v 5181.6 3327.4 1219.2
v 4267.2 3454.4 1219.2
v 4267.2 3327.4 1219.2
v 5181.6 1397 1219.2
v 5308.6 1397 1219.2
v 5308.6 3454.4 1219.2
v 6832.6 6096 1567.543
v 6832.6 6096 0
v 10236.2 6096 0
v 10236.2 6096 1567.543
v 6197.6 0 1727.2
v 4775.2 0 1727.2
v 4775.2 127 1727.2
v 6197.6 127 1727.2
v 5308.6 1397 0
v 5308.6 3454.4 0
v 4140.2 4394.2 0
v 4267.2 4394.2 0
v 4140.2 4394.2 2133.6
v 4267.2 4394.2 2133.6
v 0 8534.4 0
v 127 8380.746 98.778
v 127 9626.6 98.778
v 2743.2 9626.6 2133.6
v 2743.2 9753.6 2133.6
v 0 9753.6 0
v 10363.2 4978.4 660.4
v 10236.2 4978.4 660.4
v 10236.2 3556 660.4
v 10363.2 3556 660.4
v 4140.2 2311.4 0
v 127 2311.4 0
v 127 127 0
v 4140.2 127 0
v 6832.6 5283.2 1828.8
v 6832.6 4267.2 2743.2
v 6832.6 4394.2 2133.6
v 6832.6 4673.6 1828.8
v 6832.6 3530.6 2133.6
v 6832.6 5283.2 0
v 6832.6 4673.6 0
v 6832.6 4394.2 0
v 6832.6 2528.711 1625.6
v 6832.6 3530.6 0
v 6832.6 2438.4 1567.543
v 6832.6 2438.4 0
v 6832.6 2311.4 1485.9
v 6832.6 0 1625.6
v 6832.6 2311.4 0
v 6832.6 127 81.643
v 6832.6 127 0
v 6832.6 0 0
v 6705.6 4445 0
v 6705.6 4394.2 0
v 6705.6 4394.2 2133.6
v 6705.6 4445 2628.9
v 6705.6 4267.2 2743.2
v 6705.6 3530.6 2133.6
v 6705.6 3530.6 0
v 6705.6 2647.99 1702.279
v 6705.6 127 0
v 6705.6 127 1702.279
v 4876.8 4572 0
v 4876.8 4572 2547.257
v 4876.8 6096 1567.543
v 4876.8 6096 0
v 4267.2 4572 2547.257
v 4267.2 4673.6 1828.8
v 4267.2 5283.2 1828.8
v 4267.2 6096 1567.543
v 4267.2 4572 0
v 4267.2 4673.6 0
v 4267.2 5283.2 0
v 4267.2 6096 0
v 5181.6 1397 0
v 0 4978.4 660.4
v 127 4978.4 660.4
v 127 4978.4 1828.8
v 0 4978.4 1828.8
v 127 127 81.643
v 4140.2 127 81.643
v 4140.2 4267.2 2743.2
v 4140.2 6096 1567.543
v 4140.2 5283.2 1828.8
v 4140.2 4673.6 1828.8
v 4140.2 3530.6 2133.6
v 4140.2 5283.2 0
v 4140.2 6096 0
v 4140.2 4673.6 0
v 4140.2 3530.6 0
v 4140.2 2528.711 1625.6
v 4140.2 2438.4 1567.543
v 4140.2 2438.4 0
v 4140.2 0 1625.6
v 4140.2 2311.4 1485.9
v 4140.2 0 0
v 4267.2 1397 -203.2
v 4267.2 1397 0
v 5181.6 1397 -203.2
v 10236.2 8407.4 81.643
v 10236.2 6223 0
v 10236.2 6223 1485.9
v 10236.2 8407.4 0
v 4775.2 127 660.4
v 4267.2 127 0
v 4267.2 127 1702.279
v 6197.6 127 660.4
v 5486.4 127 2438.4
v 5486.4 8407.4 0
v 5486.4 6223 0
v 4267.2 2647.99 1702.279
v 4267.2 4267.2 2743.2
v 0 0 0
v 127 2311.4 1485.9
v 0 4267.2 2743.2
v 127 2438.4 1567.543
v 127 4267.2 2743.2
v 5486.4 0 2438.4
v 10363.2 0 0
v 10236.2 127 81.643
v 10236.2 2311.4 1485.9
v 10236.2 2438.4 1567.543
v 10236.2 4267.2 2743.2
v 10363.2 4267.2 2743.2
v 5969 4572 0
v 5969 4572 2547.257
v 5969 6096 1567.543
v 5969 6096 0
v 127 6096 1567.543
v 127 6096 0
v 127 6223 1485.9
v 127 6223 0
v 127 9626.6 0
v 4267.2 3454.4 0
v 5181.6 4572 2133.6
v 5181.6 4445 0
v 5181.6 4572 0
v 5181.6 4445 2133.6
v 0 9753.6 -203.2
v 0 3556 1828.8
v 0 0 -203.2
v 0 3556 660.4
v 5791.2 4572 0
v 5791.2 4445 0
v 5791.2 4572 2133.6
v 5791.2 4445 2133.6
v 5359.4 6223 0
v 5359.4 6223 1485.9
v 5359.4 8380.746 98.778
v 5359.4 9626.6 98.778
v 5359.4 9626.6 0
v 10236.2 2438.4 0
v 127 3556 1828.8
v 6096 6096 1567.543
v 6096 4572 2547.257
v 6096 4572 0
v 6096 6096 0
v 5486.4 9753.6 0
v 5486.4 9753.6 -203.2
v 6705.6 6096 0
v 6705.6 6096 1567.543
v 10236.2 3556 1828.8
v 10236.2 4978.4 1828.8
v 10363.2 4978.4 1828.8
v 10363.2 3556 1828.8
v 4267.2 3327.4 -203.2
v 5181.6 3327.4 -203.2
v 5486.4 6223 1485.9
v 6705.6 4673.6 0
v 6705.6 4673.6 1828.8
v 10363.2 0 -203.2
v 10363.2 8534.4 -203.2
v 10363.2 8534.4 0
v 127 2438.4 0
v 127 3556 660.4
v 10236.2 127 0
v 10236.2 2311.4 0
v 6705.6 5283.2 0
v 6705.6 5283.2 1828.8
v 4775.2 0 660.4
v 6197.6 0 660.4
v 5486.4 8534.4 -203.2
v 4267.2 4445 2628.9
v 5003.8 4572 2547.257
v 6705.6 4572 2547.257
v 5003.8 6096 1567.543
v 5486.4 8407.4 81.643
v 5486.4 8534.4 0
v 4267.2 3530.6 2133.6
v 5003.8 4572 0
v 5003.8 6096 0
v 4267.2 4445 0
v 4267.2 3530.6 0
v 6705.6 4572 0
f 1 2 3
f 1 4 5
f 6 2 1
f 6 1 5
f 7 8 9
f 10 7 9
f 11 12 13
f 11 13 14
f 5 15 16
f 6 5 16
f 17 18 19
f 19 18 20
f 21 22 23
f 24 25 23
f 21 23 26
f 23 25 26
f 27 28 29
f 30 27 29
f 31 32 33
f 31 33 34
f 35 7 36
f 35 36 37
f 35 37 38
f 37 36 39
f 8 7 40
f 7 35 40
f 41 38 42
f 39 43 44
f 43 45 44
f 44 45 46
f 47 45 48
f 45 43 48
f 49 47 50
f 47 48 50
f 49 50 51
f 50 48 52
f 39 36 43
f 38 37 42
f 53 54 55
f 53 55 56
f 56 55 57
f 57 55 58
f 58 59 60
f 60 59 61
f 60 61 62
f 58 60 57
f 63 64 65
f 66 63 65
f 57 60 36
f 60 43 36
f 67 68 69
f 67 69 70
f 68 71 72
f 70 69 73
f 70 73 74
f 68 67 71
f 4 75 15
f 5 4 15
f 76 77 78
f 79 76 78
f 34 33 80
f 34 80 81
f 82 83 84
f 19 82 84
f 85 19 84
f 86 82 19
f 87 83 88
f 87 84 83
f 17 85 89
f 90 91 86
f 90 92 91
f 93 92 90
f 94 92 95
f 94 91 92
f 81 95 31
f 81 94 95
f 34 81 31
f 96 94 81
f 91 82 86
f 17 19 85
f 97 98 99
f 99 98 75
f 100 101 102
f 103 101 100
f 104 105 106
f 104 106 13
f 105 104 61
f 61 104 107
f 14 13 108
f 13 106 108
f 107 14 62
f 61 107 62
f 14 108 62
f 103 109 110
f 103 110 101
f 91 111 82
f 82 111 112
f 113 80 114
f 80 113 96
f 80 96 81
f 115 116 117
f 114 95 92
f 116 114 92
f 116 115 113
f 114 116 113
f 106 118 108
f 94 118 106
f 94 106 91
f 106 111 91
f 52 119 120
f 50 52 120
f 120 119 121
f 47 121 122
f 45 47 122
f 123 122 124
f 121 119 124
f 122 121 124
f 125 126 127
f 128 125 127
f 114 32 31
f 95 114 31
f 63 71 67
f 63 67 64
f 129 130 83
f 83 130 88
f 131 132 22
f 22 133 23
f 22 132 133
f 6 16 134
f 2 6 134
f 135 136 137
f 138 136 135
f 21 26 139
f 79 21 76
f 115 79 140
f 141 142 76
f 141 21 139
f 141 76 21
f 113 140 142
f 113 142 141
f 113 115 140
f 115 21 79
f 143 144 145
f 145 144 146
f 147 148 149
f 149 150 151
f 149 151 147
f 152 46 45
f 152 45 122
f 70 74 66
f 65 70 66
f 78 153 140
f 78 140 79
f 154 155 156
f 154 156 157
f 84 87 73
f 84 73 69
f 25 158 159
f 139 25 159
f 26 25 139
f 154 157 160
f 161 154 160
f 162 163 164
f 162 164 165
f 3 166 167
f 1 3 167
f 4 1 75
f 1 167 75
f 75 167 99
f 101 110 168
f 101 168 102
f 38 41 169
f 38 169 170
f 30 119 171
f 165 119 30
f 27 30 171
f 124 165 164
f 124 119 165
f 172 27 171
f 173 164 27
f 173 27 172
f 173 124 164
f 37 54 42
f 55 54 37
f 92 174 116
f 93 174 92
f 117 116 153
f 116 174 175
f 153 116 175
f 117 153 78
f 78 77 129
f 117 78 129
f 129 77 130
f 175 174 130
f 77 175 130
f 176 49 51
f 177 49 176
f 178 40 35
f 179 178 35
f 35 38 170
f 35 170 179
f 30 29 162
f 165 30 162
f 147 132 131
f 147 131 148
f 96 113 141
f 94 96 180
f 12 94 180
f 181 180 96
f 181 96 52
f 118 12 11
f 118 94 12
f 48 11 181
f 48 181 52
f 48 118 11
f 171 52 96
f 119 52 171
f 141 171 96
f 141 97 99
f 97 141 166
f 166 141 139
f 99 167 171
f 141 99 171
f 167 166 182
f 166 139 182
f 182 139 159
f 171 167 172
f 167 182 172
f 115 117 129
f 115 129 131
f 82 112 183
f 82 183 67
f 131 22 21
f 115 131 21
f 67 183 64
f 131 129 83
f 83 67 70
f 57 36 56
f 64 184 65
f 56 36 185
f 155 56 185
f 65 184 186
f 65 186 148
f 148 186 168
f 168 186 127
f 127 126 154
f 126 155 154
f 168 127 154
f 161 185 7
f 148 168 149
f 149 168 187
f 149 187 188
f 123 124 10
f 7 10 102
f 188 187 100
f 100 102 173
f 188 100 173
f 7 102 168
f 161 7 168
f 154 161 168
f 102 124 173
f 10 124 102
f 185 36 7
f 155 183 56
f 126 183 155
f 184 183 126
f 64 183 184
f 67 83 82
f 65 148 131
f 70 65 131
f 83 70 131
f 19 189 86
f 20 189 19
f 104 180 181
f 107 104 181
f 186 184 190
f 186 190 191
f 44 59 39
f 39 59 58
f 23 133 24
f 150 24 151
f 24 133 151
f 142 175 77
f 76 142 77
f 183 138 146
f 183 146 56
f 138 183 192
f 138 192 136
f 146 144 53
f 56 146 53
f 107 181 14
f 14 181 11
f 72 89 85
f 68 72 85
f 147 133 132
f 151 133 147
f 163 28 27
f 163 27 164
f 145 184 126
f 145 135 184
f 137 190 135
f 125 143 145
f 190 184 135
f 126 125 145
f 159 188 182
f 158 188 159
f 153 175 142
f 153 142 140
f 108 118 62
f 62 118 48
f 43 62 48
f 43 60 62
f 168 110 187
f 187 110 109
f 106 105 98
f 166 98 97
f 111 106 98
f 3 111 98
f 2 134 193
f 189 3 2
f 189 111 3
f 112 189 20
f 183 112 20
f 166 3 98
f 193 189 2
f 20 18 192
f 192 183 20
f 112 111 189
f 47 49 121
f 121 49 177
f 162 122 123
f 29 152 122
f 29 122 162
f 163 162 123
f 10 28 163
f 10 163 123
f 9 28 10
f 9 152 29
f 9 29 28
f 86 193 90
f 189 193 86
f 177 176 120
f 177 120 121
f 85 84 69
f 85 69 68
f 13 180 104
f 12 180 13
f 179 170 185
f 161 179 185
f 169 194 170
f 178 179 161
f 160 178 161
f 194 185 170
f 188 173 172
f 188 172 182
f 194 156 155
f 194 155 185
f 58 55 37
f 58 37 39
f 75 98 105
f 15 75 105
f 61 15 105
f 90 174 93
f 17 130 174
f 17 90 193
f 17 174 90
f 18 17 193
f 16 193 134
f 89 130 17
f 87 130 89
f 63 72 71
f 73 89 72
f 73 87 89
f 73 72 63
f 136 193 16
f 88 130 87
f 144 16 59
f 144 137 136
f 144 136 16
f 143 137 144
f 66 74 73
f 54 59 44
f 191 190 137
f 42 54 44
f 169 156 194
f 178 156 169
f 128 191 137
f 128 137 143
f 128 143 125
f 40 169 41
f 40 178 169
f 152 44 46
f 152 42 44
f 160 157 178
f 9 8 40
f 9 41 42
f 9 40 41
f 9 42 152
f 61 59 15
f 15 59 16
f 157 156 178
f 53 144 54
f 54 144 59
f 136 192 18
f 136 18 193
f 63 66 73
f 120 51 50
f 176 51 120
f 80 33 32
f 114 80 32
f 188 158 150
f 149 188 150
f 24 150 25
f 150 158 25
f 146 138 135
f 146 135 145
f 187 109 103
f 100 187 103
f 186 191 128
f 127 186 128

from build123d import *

# Parameters (mm, degrees)
F0_W      = 4013.2
F0_H      = 2184.4
F0_H_2    = 3657.6
F0_W_2    = 2438.4
F0_H_3    = 4318
F0_W_3    = 3403.6
F0_W_4    = 609.6
F0_H_4    = 1524
F0_W_5    = 5232.4
F0_H_5    = 3403.6
F0_W_6    = 965.2
F0_W_7    = 4749.8
F1_DEPTH  = 2743.2
F2_W      = 914.4
F2_H      = 1930.4
F3_DEPTH  = 203.2
F4_W      = 863.6
F4_H      = 2133.6
F5_DEPTH  = 127
F6_W      = 863.6
F6_H      = 2133.6
F7_DEPTH  = 127
F8_W      = 609.6
F8_H      = 2133.6
F9_DEPTH  = 127
F10_W     = 1422.4
F10_H     = 1168.4
F11_DEPTH = 127
F12_W     = 609.6
F12_H     = 1828.8
F13_DEPTH = 127
F14_W     = 1422.4
F14_H     = 1168.4
F15_DEPTH = 127
F16_W     = 609.6
F16_H     = 1828.8
F17_DEPTH = 127
F19_DEPTH = 10363.201
F21_DEPTH = 1219.2
F22_W     = 1422.4
F22_H     = 1066.8
F23_DEPTH = 127
F27_DEPTH = 1219.2


with BuildPart() as f1:
    # F0 (on Top) → F1 (new body)
    with BuildSketch(Plane.XY):
        Polygon((0, 9753.6), (0, 0), (10363.2, 0), (10363.2, 8534.4), (5486.4, 8534.4), (5486.4, 9753.6), align=None)
        with Locations((2133.6, 1219.2)):
            Rectangle(F0_W, F0_H, mode=Mode.SUBTRACT)
        with Locations((2133.6, 4267.2)):
            Rectangle(F0_W, F0_H_2, mode=Mode.SUBTRACT)
        with Locations((5486.4, 2286)):
            Rectangle(F0_W_2, F0_H_3, mode=Mode.SUBTRACT)
        with Locations((8534.4, 1219.2)):
            Rectangle(F0_W_3, F0_H, mode=Mode.SUBTRACT)
        with Locations((8534.4, 4267.2)):
            Rectangle(F0_W_3, F0_H_2, mode=Mode.SUBTRACT)
        with Locations((4572, 5334)):
            Rectangle(F0_W_4, F0_H_4, mode=Mode.SUBTRACT)
        with Locations((2743.2, 7924.8)):
            Rectangle(F0_W_5, F0_H_5, mode=Mode.SUBTRACT)
        with Locations((5486.4, 5334)):
            Rectangle(F0_W_6, F0_H_4, mode=Mode.SUBTRACT)
        with Locations((6400.8, 5334)):
            Rectangle(F0_W_4, F0_H_4, mode=Mode.SUBTRACT)
        with Locations((7861.3, 7315.2)):
            Rectangle(F0_W_7, F0_H, mode=Mode.SUBTRACT)
    extrude(amount=F1_DEPTH)

    # F2 (on Top) → F3 (join)
    with BuildSketch(Plane.XY):
        Polygon((0, 9753.6), (0, 0), (10363.2, 0), (10363.2, 8534.4), (5486.4, 8534.4), (5486.4, 9753.6), align=None)
        with Locations((4724.4, 2362.2)):
            Rectangle(F2_W, F2_H, mode=Mode.SUBTRACT)
    extrude(amount=-F3_DEPTH)

    # F4 (on face) → F5 (cut, through all)
    with BuildSketch(Plane(origin=(6705.6, 0, 0), x_dir=(0, -1, 0), z_dir=(-1, 0, 0))):
        with Locations((-3962.4, 1066.8)):
            Rectangle(F4_W, F4_H)
    extrude(amount=-F5_DEPTH, mode=Mode.SUBTRACT)

    # F6 (on face) → F7 (cut, through all)
    with BuildSketch(Plane.YZ.offset(4267.2)):
        with Locations((3962.4, 1066.8)):
            Rectangle(F6_W, F6_H)
    extrude(amount=-F7_DEPTH, mode=Mode.SUBTRACT)

    # F8 (on face) → F9 (cut, through all)
    with BuildSketch(Plane.XZ.offset(-4445)):
        with Locations((5486.4, 1066.8)):
            Rectangle(F8_W, F8_H)
    extrude(amount=-F9_DEPTH, mode=Mode.SUBTRACT)

    # F10 (on face) → F11 (cut, through all)
    with BuildSketch(Plane(origin=(10236.2, 0, 0), x_dir=(0, -1, 0), z_dir=(-1, 0, 0))):
        with Locations((-4267.2, 1244.6)):
            Rectangle(F10_W, F10_H)
    extrude(amount=-F11_DEPTH, mode=Mode.SUBTRACT)

    # F12 (on face) → F13 (cut, through all)
    with BuildSketch(Plane.YZ.offset(6832.6)):
        with Locations((4978.4, 914.4)):
            Rectangle(F12_W, F12_H)
    extrude(amount=-F13_DEPTH, mode=Mode.SUBTRACT)

    # F14 (on face) → F15 (cut, through all)
    with BuildSketch(Plane.YZ.offset(127)):
        with Locations((4267.2, 1244.6)):
            Rectangle(F14_W, F14_H)
    extrude(amount=-F15_DEPTH, mode=Mode.SUBTRACT)

    # F16 (on face) → F17 (cut, through all)
    with BuildSketch(Plane(origin=(4140.2, 0, 0), x_dir=(0, -1, 0), z_dir=(-1, 0, 0))):
        with Locations((-4978.4, 914.4)):
            Rectangle(F16_W, F16_H)
    extrude(amount=-F17_DEPTH, mode=Mode.SUBTRACT)

    # F18 (on face) → F19 (cut, through all)
    with BuildSketch(Plane.YZ.offset(10363.2)):
        Polygon((0, 2743.2), (0, 0), (4267.2, 2743.2), align=None)
        Polygon((8534.4, 2743.2), (4267.2, 2743.2), (8534.4, 0), align=None)
    extrude(amount=-F19_DEPTH, mode=Mode.SUBTRACT)

    # F20 (on face) → F21 (join)
    with BuildSketch(Plane.XY):
        Polygon((4267.2, 3454.4), (4267.2, 3327.4), (5181.6, 3327.4), (5181.6, 1397), (5308.6, 1397), (5308.6, 3454.4), align=None)
    extrude(amount=F21_DEPTH)

    # F22 (on face) → F23 (join)
    with BuildSketch(Plane.XZ):
        Polygon((4140.2, 1625.6), (4140.2, 0), (6832.6, 0), (6832.6, 1625.6), (5486.4, 2438.4), align=None)
        with Locations((5486.4, 1193.8)):
            Rectangle(F22_W, F22_H, mode=Mode.SUBTRACT)
    extrude(amount=-F23_DEPTH)

    # F24 (on face) → F25 (join, up to the next surface of F1)
    with BuildSketch(Plane(origin=(0, 127, 0), x_dir=(-1, 0, 0), z_dir=(0, 1, 0))):
        Polygon((-6832.6, 81.6428571429), (-6705.6, 81.6428571429), (-6705.6, 1702.279245283), (-6832.6, 1625.6), align=None)
        Polygon((-4267.2, 1702.279245283), (-4267.2, 81.6428571429), (-4140.2, 81.6428571429), (-4140.2, 1625.6), align=None)
    extrude(until=Until.NEXT)

    # F26 (on face) → F27 (cut)
    with BuildSketch(Plane(origin=(0, 9753.6, 0), x_dir=(-1, 0, 0), z_dir=(0, 1, 0))):
        Polygon((-5486.4, 0), (-2743.2, 2133.6), (0, 0), (0, 2743.2), (-5486.4, 2743.2), align=None)
    extrude(amount=-F27_DEPTH, mode=Mode.SUBTRACT)

    # F28 (on face) → F29 (join, up to the next surface of F1)
    with BuildSketch(Plane.XZ.offset(-8534.4)):
        Polygon((0, 0), (127, 0), (127, 98.7777777778), align=None)
    extrude(until=Until.NEXT)

    # F30 (on face) → F31 (join, up to the next surface of F1)
    with BuildSketch(Plane.XZ.offset(-8534.4)):
        Polygon((5359.4, 0), (5486.4, 0), (5359.4, 98.7777777778), align=None)
    extrude(until=Until.NEXT)


solid = f1.part
